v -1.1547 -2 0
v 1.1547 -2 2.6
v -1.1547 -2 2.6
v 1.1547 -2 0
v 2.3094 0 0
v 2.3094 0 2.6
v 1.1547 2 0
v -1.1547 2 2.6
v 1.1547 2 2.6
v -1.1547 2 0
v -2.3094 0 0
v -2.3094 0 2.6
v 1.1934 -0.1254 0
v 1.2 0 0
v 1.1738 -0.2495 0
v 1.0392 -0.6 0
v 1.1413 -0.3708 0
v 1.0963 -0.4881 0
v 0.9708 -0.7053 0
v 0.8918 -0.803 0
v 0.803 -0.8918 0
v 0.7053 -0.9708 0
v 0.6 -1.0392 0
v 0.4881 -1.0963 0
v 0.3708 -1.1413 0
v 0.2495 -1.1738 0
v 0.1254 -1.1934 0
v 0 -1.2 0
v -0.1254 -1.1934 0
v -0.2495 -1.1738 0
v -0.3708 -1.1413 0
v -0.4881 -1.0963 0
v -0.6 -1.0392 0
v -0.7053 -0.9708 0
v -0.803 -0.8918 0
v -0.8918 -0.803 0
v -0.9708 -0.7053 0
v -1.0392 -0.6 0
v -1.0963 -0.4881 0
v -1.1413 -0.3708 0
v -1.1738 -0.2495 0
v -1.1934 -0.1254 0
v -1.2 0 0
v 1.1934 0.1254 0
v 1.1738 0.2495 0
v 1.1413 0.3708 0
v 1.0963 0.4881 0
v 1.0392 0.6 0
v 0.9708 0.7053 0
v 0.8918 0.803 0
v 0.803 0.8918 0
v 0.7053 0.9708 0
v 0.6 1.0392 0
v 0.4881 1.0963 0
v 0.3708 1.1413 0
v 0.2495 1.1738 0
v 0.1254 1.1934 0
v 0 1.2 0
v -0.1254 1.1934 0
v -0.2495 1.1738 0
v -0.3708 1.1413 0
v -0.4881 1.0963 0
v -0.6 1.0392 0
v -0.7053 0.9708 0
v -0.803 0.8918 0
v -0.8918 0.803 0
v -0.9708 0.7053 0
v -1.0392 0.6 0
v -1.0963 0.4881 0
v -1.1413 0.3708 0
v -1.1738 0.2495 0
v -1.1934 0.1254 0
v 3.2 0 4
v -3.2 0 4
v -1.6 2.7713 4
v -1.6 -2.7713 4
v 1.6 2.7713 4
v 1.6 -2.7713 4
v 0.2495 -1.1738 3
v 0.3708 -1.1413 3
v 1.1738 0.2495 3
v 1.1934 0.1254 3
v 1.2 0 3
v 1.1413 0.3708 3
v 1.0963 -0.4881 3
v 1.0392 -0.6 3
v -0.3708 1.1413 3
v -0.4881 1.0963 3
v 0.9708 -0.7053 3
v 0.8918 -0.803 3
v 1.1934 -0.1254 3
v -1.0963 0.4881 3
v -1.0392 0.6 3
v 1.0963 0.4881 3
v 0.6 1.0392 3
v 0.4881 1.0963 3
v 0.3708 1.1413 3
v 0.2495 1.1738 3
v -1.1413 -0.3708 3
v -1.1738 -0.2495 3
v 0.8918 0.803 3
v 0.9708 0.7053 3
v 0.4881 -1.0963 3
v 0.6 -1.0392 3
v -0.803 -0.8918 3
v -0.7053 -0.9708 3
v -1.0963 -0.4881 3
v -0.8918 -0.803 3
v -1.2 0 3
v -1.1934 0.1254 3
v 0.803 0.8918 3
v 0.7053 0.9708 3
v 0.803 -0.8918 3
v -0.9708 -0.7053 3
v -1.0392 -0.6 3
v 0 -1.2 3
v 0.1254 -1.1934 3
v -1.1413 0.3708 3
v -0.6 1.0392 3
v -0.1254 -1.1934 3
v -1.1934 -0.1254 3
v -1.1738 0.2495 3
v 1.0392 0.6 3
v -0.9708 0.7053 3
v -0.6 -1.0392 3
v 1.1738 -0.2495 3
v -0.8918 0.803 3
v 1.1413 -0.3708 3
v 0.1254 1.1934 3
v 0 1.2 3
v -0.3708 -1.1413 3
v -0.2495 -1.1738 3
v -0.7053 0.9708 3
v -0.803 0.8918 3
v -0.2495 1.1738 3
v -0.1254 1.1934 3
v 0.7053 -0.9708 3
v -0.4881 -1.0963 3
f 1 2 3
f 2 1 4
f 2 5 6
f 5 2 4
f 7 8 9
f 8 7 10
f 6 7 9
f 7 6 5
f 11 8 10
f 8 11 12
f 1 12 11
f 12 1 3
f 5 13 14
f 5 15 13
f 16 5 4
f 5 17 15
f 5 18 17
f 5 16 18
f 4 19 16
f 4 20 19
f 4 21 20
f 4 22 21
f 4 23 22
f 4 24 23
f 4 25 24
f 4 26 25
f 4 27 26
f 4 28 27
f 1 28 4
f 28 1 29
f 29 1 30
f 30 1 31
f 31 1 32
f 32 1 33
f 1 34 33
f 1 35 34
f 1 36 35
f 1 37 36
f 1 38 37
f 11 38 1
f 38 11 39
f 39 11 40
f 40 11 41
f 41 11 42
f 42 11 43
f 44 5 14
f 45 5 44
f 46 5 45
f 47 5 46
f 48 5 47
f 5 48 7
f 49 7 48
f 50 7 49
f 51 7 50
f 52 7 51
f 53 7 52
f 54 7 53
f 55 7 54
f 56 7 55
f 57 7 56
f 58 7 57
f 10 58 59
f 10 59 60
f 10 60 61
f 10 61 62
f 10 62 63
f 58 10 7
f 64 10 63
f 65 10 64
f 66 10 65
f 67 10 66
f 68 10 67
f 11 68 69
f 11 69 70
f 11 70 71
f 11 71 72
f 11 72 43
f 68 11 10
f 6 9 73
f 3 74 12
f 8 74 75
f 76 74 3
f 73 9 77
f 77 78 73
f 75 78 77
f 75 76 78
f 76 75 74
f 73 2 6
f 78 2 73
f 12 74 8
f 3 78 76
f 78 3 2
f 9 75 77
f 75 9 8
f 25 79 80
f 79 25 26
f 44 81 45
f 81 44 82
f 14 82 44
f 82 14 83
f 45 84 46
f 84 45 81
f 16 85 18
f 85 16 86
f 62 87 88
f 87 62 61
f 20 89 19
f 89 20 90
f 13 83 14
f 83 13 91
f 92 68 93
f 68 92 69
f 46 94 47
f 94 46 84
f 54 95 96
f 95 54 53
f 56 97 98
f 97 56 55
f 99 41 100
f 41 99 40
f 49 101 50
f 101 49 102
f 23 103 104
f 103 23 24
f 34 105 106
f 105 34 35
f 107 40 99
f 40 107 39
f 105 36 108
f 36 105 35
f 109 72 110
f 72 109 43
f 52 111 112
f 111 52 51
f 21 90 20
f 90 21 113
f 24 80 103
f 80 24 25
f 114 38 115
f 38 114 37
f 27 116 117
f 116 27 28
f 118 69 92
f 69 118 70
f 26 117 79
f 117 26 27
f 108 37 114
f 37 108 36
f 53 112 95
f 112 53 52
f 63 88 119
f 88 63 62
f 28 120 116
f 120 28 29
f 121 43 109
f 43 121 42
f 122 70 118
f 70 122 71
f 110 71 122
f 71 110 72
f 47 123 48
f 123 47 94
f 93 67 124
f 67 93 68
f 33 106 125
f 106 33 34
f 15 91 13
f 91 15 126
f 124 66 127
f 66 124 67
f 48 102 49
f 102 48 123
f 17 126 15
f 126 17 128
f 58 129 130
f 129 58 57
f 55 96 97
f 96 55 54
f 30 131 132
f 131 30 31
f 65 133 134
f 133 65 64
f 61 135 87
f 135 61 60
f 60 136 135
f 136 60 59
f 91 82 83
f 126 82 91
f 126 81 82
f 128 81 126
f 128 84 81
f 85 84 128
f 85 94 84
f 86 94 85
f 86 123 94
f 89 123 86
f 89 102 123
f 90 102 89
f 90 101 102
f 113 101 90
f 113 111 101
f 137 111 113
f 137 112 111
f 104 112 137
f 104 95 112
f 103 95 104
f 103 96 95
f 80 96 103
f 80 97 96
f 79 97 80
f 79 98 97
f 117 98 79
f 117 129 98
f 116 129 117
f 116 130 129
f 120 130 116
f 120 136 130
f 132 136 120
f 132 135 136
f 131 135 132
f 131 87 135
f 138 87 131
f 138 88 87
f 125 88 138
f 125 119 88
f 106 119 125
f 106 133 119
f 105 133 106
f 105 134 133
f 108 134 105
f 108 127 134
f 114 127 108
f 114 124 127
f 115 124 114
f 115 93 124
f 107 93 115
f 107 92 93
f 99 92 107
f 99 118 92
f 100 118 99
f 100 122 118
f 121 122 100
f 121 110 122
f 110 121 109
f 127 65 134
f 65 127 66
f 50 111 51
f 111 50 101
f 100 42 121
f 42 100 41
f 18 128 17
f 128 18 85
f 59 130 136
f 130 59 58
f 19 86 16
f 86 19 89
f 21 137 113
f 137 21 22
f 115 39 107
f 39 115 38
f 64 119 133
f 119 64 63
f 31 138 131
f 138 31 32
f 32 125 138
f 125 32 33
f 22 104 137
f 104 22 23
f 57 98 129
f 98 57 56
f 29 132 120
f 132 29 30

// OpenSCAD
// Blind cap nut.
$fn = 60;
eps = 0.02;
thread_d = 2.4;
flat = 4;
height = 4;
body_h = height*0.65;
difference() {
    union() {
        cylinder(d=flat/cos(30),h=body_h,$fn=6);
        translate([0,0,body_h]) cylinder(d1=flat/cos(30),d2=thread_d+4,h=height-body_h,$fn=6);
    }
    translate([0,0,-eps]) cylinder(d=thread_d,h=height-1+eps);
}
